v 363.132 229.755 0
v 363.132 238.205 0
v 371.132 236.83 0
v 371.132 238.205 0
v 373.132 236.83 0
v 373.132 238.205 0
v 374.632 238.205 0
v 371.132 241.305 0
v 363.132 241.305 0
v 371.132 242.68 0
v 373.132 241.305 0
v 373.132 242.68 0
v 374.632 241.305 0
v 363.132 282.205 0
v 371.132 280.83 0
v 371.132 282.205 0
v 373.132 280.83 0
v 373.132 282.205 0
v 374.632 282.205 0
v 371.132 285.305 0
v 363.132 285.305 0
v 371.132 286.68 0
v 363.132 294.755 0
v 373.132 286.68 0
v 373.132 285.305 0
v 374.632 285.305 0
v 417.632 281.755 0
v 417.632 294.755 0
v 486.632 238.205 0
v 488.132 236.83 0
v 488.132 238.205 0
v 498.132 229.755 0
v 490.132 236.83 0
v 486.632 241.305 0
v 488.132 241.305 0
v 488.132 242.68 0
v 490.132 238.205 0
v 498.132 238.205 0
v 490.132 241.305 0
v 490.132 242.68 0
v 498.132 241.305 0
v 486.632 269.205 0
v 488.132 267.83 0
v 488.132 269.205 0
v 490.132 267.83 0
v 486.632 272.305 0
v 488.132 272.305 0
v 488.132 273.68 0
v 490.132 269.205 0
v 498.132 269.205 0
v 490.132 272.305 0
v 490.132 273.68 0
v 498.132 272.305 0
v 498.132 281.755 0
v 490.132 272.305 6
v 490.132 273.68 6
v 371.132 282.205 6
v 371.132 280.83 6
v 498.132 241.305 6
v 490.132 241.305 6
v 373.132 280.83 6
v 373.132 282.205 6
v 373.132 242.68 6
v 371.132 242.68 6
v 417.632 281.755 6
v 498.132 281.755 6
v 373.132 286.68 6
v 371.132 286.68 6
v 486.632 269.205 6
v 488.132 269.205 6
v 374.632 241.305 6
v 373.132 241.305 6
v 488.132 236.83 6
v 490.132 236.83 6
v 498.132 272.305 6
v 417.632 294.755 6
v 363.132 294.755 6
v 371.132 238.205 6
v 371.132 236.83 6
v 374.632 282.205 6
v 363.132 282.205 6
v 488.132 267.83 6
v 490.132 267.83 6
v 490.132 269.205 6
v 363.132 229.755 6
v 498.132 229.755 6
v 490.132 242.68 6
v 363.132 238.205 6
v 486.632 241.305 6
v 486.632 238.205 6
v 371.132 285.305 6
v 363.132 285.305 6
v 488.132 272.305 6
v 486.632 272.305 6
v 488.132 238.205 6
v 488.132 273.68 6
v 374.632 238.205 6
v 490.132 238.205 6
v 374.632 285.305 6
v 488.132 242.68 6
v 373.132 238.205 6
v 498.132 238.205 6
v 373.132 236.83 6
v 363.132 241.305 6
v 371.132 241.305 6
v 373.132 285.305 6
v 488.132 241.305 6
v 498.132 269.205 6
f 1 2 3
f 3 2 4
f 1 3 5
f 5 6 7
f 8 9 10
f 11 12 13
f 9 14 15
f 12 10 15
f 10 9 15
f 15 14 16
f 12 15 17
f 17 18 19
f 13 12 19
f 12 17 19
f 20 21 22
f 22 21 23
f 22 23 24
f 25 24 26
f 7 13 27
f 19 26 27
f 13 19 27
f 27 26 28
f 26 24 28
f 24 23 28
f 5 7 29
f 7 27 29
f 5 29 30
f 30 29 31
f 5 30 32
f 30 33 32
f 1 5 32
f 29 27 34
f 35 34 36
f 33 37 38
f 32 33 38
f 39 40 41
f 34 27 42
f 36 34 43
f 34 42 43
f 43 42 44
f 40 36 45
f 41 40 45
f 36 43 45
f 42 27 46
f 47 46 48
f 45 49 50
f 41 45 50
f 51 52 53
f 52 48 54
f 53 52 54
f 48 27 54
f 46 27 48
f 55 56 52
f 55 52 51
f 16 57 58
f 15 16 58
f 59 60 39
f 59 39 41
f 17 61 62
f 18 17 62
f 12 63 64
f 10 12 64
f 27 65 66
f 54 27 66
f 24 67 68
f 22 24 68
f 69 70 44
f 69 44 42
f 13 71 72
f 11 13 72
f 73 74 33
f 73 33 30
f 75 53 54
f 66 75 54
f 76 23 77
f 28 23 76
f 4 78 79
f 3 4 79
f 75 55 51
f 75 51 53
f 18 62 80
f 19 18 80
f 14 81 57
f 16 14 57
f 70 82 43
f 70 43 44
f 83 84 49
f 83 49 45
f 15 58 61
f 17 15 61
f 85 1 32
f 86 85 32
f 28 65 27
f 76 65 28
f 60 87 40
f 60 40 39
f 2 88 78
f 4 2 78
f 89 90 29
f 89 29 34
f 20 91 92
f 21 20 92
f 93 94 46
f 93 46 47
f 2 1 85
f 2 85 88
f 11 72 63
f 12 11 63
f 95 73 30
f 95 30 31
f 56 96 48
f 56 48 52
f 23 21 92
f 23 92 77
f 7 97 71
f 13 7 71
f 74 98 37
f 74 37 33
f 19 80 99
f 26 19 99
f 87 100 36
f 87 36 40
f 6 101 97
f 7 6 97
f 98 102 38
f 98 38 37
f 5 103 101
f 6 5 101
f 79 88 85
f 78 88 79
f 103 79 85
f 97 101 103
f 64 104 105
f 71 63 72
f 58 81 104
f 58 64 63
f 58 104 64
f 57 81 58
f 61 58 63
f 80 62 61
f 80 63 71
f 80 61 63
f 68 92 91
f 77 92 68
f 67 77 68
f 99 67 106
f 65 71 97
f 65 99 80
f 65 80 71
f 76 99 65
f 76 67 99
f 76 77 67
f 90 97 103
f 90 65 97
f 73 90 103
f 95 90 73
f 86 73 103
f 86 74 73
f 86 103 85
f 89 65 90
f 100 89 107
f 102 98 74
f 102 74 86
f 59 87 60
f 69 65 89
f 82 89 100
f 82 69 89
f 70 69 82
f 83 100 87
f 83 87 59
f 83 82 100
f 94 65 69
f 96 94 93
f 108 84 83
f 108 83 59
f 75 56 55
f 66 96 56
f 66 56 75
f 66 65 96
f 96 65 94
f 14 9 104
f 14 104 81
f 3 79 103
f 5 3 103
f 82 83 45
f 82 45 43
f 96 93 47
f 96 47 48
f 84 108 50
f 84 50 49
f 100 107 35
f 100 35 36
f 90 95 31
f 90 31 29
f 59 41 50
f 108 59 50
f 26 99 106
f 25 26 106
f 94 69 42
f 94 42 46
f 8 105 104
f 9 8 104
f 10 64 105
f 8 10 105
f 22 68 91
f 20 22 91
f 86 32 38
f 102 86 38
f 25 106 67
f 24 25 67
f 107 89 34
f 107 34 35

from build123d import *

# Parameters (mm, degrees)
SZKIC1_W                    = 135
SZKIC1_H                    = 65
DODANIE_WYCI_GNI_CIE1_DEPTH = 6
WYTNIJ_WYCI_GNI_CIE1_DEPTH  = 6
SZYK_LINIOWY1_COUNT         = 2
SZYK_LINIOWY1_PITCH         = 44
SZYK_LINIOWY2_COUNT         = 2
SZYK_LINIOWY2_PITCH         = 31
SZYK_LINIOWY2_COPY_1_DEPTH  = 6
SZKIC3_W                    = 15.645494432
SZKIC3_H                    = 9.425
DODANIE_WYCI_GNI_CIE2_DEPTH = 6
SZKIC4_W                    = 80.5
SZKIC4_H                    = 13
WYTNIJ_WYCI_GNI_CIE2_DEPTH  = 6


with BuildPart() as part:
    # Szkic1 → Dodanie-wyciągnięcie1 (new body)
    with BuildSketch(Plane.XY):
        with Locations((430.631728381, 262.255356576)):
            Rectangle(SZKIC1_W, SZKIC1_H)
    extrude(amount=DODANIE_WYCI_GNI_CIE1_DEPTH)

    # Szkic2 → Wytnij-wyciągnięcie1 (cut)
    with BuildSketch(Plane.XY.offset(6)):
        Polygon((363.131728381, 241.305356576), (363.131728381, 238.205356576), (371.131728381, 238.205356576), (371.131728381, 236.830356576), (373.131728381, 236.830356576), (373.131728381, 238.205356576), (374.631728381, 238.205356576), (374.631728381, 241.305356576), (373.131728381, 241.305356576), (373.131728381, 242.680356576), (371.131728381, 242.680356576), (371.131728381, 241.305356576), align=None)
    wytnij_wyci_gni_cie1 = extrude(amount=-WYTNIJ_WYCI_GNI_CIE1_DEPTH, mode=Mode.SUBTRACT)

    # Szyk liniowy1: Wytnij-wyciągnięcie1 ×2
    with Locations(*[(0, i * SZYK_LINIOWY1_PITCH, 0) for i in range(1, SZYK_LINIOWY1_COUNT)]):
        add(wytnij_wyci_gni_cie1, mode=Mode.SUBTRACT)

    # Lustro1: Wytnij-wyciągnięcie1 across plane
    add(wytnij_wyci_gni_cie1.mirror(Plane.ZY.offset(-430.631728381)), mode=Mode.SUBTRACT)

    # Szyk liniowy2: Wytnij-wyciągnięcie1 ×2
    with Locations(*[(0, i * SZYK_LINIOWY2_PITCH, 0) for i in range(1, SZYK_LINIOWY2_COUNT)]):
        add(wytnij_wyci_gni_cie1, mode=Mode.SUBTRACT)

    # Szyk liniowy2 copy 1 sketch → Szyk liniowy2 copy 1 (cut)
    with BuildSketch(Plane(origin=(861.263456762, 31, 6), x_dir=(-1, 0, 0), z_dir=(0, 0, 1))):
        Polygon((363.131728381, -241.305356576), (363.131728381, -238.205356576), (371.131728381, -238.205356576), (371.131728381, -236.830356576), (373.131728381, -236.830356576), (373.131728381, -238.205356576), (374.631728381, -238.205356576), (374.631728381, -241.305356576), (373.131728381, -241.305356576), (373.131728381, -242.680356576), (371.131728381, -242.680356576), (371.131728381, -241.305356576), align=None)
    extrude(amount=-SZYK_LINIOWY2_COPY_1_DEPTH, mode=Mode.SUBTRACT)

    # Szkic3 → Dodanie-wyciągnięcie2 (add)
    with BuildSketch(Plane.XY.offset(6)):
        with Locations((370.954475597, 272.542856576)):
            Rectangle(SZKIC3_W, SZKIC3_H)
    extrude(amount=-DODANIE_WYCI_GNI_CIE2_DEPTH)

    # Szkic4 → Wytnij-wyciągnięcie2 (cut)
    with BuildSketch(Plane.XY.offset(6)):
        with Locations((457.881728381, 288.255356576)):
            Rectangle(SZKIC4_W, SZKIC4_H)
    extrude(amount=-WYTNIJ_WYCI_GNI_CIE2_DEPTH, mode=Mode.SUBTRACT)


solid = part.part
